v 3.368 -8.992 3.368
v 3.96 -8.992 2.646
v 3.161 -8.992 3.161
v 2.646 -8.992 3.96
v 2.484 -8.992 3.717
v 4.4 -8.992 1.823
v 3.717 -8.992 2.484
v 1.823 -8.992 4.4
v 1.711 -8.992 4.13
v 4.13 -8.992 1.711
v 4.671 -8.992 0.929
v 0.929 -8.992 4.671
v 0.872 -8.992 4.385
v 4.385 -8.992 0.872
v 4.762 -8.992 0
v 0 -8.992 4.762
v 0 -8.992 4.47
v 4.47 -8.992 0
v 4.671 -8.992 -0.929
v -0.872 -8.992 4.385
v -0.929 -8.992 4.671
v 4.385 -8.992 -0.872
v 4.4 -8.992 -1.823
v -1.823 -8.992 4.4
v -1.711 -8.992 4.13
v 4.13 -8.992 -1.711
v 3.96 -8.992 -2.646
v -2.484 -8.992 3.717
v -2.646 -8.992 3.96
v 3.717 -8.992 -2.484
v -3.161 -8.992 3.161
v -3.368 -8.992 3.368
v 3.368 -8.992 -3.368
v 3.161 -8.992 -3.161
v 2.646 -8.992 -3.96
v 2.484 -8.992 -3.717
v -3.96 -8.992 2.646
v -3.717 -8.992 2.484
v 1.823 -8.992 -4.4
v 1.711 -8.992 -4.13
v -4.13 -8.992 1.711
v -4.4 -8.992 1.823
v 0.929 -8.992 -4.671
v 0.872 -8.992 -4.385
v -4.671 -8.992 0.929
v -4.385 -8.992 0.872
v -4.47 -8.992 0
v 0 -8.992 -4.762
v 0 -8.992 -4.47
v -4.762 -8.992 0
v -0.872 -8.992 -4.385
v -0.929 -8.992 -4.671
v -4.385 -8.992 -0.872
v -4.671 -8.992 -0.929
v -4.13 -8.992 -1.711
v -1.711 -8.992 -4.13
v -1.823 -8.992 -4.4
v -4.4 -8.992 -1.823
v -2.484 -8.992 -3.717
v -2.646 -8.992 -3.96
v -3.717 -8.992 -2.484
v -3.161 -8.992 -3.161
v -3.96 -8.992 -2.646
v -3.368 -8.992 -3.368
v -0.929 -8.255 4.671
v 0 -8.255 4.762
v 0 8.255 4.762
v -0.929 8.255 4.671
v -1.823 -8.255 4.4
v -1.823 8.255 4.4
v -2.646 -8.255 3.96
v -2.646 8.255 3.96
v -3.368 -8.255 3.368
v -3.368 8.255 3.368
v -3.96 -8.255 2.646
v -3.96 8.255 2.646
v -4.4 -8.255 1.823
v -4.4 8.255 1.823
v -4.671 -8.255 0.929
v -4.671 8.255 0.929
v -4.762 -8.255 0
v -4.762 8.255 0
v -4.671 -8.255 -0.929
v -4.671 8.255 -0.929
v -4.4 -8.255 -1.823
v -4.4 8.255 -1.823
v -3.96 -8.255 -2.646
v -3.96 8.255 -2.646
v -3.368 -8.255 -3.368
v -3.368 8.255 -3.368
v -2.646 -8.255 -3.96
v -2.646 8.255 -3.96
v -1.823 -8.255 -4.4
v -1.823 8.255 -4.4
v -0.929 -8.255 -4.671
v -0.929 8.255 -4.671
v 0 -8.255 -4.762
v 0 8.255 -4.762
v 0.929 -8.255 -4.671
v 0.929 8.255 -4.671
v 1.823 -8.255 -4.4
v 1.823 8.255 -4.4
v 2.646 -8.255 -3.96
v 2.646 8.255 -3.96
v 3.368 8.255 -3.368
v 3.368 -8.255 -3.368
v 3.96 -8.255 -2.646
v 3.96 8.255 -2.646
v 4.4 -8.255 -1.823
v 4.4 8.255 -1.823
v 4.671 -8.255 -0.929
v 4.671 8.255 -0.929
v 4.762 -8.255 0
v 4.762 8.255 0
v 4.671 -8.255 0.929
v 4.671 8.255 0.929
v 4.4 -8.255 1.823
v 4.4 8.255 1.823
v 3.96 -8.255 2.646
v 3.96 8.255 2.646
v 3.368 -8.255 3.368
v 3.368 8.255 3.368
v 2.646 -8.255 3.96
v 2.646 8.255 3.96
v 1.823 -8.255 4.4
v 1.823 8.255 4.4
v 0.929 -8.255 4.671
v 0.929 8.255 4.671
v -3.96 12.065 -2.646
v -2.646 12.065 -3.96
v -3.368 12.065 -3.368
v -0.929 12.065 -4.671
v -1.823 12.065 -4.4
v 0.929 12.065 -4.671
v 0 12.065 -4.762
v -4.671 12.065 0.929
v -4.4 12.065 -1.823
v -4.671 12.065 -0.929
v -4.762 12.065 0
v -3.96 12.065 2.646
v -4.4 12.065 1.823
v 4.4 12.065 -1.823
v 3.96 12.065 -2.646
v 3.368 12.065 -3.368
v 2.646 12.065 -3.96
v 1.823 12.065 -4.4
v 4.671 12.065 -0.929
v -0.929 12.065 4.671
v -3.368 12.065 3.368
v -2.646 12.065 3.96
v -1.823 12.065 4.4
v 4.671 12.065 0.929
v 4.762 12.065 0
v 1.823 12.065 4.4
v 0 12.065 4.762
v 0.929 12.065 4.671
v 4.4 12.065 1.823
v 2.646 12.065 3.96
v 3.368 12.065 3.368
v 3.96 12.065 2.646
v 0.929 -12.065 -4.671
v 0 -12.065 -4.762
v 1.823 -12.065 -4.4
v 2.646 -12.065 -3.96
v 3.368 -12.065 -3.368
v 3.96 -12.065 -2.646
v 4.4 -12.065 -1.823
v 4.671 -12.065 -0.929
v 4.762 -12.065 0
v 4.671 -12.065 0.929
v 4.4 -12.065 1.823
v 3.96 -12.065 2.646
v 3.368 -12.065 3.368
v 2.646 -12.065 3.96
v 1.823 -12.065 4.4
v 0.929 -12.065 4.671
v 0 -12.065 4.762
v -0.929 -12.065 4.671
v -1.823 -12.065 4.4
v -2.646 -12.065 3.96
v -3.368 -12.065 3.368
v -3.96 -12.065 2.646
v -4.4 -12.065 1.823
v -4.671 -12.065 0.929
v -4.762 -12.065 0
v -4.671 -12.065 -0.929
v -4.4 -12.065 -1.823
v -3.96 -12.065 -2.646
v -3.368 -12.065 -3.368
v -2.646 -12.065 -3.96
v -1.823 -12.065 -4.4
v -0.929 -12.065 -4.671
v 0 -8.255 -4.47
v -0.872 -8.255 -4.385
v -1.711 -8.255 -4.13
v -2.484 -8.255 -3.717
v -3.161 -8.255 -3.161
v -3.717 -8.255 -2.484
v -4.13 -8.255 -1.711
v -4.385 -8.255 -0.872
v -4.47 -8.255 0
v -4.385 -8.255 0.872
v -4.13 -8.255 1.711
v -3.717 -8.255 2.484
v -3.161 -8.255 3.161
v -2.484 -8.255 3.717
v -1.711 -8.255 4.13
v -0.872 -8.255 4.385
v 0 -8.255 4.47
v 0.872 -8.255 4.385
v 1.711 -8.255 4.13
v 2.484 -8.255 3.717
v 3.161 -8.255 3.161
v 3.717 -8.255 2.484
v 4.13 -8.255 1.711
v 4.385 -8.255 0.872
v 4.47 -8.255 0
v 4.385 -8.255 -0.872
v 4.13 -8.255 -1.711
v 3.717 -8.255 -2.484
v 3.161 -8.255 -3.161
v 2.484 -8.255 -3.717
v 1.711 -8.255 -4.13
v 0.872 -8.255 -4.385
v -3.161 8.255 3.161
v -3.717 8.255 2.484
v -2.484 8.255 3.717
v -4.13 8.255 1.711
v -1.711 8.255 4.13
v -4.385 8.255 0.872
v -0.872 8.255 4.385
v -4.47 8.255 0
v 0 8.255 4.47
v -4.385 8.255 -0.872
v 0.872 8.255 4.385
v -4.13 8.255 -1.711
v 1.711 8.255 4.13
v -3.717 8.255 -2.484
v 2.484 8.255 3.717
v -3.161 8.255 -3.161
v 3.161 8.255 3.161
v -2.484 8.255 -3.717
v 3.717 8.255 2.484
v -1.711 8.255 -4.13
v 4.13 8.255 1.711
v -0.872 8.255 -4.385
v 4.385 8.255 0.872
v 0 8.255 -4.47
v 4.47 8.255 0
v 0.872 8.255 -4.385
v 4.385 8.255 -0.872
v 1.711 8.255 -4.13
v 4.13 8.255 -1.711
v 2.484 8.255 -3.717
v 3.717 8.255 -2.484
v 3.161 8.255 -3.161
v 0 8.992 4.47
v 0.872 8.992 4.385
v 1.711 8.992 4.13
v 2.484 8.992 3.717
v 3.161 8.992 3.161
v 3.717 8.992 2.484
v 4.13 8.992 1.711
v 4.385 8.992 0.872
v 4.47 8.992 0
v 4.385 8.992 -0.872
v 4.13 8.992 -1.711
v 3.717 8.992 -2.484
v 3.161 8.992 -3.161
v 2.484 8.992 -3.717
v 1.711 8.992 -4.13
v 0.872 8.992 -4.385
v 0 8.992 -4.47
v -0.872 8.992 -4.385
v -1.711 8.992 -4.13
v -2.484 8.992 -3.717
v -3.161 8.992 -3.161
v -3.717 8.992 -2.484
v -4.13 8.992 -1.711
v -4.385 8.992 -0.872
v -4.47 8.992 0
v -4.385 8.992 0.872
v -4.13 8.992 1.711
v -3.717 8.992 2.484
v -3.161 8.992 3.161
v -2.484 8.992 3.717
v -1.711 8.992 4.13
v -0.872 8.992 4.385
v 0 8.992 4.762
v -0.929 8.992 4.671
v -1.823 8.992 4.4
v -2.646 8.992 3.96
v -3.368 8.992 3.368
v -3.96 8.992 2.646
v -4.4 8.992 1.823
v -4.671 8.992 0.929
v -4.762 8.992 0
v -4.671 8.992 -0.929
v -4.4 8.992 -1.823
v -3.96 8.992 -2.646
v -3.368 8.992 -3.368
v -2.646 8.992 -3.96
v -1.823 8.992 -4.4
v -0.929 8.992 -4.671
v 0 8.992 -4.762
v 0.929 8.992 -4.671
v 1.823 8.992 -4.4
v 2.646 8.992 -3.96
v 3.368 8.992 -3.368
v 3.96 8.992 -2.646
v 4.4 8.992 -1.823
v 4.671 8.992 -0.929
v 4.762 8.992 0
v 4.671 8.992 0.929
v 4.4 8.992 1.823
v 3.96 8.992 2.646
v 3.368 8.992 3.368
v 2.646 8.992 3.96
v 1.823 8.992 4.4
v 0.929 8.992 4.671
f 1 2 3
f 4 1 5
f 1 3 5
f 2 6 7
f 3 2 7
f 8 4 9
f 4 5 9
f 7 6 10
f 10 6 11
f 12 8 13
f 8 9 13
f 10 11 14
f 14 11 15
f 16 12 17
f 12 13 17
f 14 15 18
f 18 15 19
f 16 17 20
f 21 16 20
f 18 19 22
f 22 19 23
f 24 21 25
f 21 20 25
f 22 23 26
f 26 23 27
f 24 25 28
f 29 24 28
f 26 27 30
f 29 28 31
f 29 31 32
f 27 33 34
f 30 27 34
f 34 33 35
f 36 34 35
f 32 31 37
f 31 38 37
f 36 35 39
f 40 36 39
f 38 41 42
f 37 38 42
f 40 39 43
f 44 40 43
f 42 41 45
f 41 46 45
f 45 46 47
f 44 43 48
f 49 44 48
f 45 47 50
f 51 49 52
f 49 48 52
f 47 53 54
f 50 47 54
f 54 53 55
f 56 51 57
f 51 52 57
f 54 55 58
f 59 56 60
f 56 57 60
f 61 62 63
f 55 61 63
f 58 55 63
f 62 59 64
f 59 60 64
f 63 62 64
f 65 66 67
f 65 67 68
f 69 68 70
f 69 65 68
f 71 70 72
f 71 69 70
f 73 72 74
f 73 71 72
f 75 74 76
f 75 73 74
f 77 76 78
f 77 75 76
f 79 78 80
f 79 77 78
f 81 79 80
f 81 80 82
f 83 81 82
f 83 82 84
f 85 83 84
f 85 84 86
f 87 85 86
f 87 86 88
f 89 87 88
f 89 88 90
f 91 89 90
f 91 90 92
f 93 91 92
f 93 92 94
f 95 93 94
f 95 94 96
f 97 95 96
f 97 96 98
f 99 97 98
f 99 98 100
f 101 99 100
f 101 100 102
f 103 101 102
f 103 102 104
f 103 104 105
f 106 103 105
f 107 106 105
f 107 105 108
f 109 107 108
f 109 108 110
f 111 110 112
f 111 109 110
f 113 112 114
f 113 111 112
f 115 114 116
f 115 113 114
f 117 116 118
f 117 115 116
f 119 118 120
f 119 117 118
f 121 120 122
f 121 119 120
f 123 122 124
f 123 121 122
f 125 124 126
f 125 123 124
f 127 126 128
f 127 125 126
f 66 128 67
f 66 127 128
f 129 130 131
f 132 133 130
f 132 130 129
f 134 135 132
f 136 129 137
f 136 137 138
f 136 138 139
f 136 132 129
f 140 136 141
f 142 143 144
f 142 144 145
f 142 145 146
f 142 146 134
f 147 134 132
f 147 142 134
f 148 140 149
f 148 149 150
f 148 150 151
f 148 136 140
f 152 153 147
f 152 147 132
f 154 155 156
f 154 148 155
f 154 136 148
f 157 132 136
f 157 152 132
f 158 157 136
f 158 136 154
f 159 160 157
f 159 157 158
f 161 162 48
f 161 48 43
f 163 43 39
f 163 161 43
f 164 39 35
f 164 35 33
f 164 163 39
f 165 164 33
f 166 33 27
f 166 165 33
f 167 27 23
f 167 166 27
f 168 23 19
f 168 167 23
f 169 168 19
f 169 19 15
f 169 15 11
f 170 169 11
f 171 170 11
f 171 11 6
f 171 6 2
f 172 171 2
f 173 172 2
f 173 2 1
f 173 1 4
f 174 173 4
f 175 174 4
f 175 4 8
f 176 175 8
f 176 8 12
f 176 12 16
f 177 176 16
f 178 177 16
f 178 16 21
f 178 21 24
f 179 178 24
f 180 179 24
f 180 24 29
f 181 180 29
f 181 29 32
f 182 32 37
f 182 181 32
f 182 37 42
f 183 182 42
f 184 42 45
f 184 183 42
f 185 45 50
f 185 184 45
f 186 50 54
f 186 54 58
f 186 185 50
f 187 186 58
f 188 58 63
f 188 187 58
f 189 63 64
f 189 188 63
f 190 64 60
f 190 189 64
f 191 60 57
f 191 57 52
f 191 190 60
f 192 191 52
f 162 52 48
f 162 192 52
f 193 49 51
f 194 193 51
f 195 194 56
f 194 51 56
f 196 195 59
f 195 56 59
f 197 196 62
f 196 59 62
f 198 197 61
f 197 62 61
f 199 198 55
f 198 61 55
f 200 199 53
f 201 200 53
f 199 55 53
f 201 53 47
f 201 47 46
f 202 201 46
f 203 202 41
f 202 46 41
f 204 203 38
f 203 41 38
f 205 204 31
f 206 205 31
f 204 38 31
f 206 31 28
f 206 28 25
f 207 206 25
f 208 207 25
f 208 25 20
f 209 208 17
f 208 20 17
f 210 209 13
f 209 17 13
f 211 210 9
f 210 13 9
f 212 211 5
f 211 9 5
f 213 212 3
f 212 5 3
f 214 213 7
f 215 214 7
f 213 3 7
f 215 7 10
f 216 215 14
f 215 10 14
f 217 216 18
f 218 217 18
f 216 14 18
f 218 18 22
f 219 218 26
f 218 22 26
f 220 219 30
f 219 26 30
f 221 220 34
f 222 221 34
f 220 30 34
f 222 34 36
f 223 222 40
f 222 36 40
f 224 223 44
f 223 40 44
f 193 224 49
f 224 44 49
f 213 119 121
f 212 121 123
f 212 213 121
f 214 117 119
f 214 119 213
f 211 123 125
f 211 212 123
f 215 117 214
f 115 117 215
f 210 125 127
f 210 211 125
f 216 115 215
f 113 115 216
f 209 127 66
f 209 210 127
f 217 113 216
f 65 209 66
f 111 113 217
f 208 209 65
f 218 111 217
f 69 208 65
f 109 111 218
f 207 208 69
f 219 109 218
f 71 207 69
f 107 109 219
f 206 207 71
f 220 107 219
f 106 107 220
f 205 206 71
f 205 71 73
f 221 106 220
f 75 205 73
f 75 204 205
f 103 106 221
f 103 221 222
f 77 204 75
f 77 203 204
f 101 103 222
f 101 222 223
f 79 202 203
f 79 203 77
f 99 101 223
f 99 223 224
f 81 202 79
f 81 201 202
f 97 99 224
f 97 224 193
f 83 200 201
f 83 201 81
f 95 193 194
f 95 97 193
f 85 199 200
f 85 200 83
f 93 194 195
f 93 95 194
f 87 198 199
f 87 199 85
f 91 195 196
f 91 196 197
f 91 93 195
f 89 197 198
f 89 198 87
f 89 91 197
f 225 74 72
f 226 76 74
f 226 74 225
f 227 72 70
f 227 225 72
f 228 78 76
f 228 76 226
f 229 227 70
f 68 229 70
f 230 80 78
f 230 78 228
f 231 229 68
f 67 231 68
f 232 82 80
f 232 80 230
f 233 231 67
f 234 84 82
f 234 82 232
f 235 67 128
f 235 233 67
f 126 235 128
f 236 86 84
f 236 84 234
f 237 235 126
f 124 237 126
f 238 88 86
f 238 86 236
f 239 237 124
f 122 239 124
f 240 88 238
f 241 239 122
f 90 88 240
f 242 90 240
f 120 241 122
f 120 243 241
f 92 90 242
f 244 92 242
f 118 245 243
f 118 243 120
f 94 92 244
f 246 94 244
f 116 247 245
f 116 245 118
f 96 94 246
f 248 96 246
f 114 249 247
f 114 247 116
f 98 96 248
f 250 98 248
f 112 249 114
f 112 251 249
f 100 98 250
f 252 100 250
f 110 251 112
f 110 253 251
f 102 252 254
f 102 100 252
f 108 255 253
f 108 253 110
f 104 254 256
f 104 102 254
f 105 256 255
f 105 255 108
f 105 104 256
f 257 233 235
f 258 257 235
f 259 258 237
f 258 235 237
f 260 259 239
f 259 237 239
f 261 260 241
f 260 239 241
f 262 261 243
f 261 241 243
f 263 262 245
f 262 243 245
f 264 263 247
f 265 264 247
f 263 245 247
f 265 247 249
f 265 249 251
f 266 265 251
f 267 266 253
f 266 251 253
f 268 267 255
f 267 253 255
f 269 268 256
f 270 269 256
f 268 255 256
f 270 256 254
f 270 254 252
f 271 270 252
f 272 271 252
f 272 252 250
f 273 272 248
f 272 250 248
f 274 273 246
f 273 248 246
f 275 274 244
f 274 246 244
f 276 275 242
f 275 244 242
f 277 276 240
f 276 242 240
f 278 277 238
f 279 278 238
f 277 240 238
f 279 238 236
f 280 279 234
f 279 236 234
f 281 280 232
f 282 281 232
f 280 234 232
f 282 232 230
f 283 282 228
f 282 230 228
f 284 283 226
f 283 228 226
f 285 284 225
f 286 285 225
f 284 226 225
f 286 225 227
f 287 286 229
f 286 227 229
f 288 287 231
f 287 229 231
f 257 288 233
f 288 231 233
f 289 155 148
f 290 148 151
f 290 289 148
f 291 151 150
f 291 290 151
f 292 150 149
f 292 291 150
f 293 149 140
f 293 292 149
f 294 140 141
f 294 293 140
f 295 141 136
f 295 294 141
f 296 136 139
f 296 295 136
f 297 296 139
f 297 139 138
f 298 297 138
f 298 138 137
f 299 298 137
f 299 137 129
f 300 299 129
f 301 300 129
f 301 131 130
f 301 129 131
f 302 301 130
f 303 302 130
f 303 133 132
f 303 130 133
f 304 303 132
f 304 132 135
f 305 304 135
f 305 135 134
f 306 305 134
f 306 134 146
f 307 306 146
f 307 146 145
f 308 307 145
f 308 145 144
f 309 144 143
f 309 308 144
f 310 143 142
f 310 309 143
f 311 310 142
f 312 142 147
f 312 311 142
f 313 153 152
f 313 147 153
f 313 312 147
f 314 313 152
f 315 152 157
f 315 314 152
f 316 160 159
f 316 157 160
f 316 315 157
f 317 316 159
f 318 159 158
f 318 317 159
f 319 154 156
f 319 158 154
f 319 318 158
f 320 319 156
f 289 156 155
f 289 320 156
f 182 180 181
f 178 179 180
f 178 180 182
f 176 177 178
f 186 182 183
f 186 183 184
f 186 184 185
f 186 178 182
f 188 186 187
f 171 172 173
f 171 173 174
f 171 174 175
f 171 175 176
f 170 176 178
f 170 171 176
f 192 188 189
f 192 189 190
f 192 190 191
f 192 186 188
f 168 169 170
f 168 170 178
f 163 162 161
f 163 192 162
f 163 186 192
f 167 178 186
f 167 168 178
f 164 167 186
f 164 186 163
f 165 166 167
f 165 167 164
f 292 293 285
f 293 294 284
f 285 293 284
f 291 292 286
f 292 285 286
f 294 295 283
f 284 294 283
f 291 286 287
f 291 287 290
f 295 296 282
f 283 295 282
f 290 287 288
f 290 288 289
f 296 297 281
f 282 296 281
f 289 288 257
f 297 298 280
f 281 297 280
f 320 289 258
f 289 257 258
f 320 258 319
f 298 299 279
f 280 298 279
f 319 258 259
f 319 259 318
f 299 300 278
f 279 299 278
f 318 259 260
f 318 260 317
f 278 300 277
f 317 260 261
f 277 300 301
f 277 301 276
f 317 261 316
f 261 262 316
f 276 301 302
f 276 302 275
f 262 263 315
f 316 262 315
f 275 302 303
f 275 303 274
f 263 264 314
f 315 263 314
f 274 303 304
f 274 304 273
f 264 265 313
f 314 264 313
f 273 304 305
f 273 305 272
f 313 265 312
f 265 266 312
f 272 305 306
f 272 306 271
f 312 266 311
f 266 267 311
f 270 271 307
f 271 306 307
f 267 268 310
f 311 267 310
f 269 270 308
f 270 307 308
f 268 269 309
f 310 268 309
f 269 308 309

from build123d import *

# Parameters (mm, degrees)
BOSS_EXTRUDE1_DEPTH      = 8.255
BOSS_EXTRUDE1_DEPTH_BACK = 8.255
SKETCH1_R                = 4.7625
SKETCH2_R                = 4.7625
BOSS_EXTRUDE2_DEPTH      = 3.81
BOSS_EXTRUDE3_START      = 3.81
SKETCH3_R                = 4.7625
BOSS_EXTRUDE3_DEPTH      = 3.81
SKETCH4_R                = 5.08
CUT_EXTRUDE1_DEPTH       = 0.7366
SKETCH5_R                = 5.08
CUT_EXTRUDE2_DEPTH       = 0.7366
SKETCH6_R                = 4.4704
BOSS_EXTRUDE4_DEPTH      = 0.7366
SKETCH7_R                = 4.4704
BOSS_EXTRUDE5_DEPTH      = 0.7366


with BuildPart() as part:
    # Sketch1 → Boss-Extrude1 (new, two sides: drawn at the far end of the back side and taken through both)
    with BuildSketch(Plane(origin=(0, 0, 0), x_dir=(1, 0, 0), z_dir=(0, 1, 0)).offset(-BOSS_EXTRUDE1_DEPTH_BACK)):
        with Locations(Location((0, 0, 0), (0, 0, 270))):
            Circle(SKETCH1_R)
    extrude(amount=BOSS_EXTRUDE1_DEPTH + BOSS_EXTRUDE1_DEPTH_BACK)

    # Sketch2 → Boss-Extrude2 (add)
    with BuildSketch(Plane(origin=(0, 8.255, 0), x_dir=(1, 0, 0), z_dir=(0, 1, 0))):
        with Locations(Location((0, 0, 0), (0, 0, 270))):
            Circle(SKETCH2_R)
    extrude(amount=BOSS_EXTRUDE2_DEPTH)

    # Sketch3 → Boss-Extrude3 (add)
    with BuildSketch(Plane(origin=(0, -8.255, 0), x_dir=(-1, 0, 0), z_dir=(0, -1, 0)).offset(BOSS_EXTRUDE3_START)):
        with Locations(Location((0, 0, 0), (0, 0, 90))):
            Circle(SKETCH3_R)
    extrude(amount=-BOSS_EXTRUDE3_DEPTH)

    # Sketch4 → Cut-Extrude1 (cut)
    with BuildSketch(Plane(origin=(0, -8.9916, 0), x_dir=(-1, 0, 0), z_dir=(0, -1, 0))):
        Circle(SKETCH4_R)
    extrude(amount=-CUT_EXTRUDE1_DEPTH, mode=Mode.SUBTRACT)


with BuildPart() as cut_extrude1_piece_1:
    # of the separate pieces the step leaves, piece 1, a body of its own (cut_extrude1_pieces)
    add(part.part.solids().sort_by_distance((0, 12.065, 4.7625))[0])

    # Sketch5 → Cut-Extrude2 (cut)
    with BuildSketch(Plane(origin=(0, 8.9916, 0), x_dir=(1, 0, 0), z_dir=(0, 1, 0))):
        Circle(SKETCH5_R)
    extrude(amount=-CUT_EXTRUDE2_DEPTH, mode=Mode.SUBTRACT)


with BuildPart() as cut_extrude1_piece_2:
    # of the separate pieces the step leaves, piece 2, a body of its own (cut_extrude1_pieces)
    add(part.part.solids().sort_by_distance((0, -12.065, -4.7625))[0])



with BuildPart() as cut_extrude2_piece_1:
    # of the separate pieces the step leaves, piece 1, a body of its own (cut_extrude2_pieces)
    add(cut_extrude1_piece_1.part.solids().sort_by_distance((0, 8.255, 4.7625))[0])


with BuildPart() as cut_extrude2_piece_2:
    # of the separate pieces the step leaves, piece 2, a body of its own (cut_extrude2_pieces)
    add(cut_extrude1_piece_1.part.solids().sort_by_distance((0, 12.065, 4.7625))[0])


with BuildPart() as cut_extrude1_piece_2_1:
    add(cut_extrude1_piece_2.part)

    add(cut_extrude2_piece_1.part)  # Boss-Extrude4 merges Cut-Extrude2 piece 1
    # Sketch6 → Boss-Extrude4 (add)
    with BuildSketch(Plane(origin=(0, -8.9916, 0), x_dir=(1, 0, 0), z_dir=(0, 1, 0))):
        with Locations(Location((0, 0, 0), (0, 0, 90))):
            Circle(SKETCH6_R)
    extrude(amount=BOSS_EXTRUDE4_DEPTH)


    add(cut_extrude2_piece_2.part)  # Boss-Extrude5 merges Cut-Extrude2 piece 2
    # Sketch7 → Boss-Extrude5 (add)
    with BuildSketch(Plane(origin=(0, 8.255, 0), x_dir=(1, 0, 0), z_dir=(0, 1, 0))):
        with Locations(Location((0, 0, 0), (0, 0, 270))):
            Circle(SKETCH7_R)
    extrude(amount=BOSS_EXTRUDE5_DEPTH)


solid = cut_extrude1_piece_2_1.part
